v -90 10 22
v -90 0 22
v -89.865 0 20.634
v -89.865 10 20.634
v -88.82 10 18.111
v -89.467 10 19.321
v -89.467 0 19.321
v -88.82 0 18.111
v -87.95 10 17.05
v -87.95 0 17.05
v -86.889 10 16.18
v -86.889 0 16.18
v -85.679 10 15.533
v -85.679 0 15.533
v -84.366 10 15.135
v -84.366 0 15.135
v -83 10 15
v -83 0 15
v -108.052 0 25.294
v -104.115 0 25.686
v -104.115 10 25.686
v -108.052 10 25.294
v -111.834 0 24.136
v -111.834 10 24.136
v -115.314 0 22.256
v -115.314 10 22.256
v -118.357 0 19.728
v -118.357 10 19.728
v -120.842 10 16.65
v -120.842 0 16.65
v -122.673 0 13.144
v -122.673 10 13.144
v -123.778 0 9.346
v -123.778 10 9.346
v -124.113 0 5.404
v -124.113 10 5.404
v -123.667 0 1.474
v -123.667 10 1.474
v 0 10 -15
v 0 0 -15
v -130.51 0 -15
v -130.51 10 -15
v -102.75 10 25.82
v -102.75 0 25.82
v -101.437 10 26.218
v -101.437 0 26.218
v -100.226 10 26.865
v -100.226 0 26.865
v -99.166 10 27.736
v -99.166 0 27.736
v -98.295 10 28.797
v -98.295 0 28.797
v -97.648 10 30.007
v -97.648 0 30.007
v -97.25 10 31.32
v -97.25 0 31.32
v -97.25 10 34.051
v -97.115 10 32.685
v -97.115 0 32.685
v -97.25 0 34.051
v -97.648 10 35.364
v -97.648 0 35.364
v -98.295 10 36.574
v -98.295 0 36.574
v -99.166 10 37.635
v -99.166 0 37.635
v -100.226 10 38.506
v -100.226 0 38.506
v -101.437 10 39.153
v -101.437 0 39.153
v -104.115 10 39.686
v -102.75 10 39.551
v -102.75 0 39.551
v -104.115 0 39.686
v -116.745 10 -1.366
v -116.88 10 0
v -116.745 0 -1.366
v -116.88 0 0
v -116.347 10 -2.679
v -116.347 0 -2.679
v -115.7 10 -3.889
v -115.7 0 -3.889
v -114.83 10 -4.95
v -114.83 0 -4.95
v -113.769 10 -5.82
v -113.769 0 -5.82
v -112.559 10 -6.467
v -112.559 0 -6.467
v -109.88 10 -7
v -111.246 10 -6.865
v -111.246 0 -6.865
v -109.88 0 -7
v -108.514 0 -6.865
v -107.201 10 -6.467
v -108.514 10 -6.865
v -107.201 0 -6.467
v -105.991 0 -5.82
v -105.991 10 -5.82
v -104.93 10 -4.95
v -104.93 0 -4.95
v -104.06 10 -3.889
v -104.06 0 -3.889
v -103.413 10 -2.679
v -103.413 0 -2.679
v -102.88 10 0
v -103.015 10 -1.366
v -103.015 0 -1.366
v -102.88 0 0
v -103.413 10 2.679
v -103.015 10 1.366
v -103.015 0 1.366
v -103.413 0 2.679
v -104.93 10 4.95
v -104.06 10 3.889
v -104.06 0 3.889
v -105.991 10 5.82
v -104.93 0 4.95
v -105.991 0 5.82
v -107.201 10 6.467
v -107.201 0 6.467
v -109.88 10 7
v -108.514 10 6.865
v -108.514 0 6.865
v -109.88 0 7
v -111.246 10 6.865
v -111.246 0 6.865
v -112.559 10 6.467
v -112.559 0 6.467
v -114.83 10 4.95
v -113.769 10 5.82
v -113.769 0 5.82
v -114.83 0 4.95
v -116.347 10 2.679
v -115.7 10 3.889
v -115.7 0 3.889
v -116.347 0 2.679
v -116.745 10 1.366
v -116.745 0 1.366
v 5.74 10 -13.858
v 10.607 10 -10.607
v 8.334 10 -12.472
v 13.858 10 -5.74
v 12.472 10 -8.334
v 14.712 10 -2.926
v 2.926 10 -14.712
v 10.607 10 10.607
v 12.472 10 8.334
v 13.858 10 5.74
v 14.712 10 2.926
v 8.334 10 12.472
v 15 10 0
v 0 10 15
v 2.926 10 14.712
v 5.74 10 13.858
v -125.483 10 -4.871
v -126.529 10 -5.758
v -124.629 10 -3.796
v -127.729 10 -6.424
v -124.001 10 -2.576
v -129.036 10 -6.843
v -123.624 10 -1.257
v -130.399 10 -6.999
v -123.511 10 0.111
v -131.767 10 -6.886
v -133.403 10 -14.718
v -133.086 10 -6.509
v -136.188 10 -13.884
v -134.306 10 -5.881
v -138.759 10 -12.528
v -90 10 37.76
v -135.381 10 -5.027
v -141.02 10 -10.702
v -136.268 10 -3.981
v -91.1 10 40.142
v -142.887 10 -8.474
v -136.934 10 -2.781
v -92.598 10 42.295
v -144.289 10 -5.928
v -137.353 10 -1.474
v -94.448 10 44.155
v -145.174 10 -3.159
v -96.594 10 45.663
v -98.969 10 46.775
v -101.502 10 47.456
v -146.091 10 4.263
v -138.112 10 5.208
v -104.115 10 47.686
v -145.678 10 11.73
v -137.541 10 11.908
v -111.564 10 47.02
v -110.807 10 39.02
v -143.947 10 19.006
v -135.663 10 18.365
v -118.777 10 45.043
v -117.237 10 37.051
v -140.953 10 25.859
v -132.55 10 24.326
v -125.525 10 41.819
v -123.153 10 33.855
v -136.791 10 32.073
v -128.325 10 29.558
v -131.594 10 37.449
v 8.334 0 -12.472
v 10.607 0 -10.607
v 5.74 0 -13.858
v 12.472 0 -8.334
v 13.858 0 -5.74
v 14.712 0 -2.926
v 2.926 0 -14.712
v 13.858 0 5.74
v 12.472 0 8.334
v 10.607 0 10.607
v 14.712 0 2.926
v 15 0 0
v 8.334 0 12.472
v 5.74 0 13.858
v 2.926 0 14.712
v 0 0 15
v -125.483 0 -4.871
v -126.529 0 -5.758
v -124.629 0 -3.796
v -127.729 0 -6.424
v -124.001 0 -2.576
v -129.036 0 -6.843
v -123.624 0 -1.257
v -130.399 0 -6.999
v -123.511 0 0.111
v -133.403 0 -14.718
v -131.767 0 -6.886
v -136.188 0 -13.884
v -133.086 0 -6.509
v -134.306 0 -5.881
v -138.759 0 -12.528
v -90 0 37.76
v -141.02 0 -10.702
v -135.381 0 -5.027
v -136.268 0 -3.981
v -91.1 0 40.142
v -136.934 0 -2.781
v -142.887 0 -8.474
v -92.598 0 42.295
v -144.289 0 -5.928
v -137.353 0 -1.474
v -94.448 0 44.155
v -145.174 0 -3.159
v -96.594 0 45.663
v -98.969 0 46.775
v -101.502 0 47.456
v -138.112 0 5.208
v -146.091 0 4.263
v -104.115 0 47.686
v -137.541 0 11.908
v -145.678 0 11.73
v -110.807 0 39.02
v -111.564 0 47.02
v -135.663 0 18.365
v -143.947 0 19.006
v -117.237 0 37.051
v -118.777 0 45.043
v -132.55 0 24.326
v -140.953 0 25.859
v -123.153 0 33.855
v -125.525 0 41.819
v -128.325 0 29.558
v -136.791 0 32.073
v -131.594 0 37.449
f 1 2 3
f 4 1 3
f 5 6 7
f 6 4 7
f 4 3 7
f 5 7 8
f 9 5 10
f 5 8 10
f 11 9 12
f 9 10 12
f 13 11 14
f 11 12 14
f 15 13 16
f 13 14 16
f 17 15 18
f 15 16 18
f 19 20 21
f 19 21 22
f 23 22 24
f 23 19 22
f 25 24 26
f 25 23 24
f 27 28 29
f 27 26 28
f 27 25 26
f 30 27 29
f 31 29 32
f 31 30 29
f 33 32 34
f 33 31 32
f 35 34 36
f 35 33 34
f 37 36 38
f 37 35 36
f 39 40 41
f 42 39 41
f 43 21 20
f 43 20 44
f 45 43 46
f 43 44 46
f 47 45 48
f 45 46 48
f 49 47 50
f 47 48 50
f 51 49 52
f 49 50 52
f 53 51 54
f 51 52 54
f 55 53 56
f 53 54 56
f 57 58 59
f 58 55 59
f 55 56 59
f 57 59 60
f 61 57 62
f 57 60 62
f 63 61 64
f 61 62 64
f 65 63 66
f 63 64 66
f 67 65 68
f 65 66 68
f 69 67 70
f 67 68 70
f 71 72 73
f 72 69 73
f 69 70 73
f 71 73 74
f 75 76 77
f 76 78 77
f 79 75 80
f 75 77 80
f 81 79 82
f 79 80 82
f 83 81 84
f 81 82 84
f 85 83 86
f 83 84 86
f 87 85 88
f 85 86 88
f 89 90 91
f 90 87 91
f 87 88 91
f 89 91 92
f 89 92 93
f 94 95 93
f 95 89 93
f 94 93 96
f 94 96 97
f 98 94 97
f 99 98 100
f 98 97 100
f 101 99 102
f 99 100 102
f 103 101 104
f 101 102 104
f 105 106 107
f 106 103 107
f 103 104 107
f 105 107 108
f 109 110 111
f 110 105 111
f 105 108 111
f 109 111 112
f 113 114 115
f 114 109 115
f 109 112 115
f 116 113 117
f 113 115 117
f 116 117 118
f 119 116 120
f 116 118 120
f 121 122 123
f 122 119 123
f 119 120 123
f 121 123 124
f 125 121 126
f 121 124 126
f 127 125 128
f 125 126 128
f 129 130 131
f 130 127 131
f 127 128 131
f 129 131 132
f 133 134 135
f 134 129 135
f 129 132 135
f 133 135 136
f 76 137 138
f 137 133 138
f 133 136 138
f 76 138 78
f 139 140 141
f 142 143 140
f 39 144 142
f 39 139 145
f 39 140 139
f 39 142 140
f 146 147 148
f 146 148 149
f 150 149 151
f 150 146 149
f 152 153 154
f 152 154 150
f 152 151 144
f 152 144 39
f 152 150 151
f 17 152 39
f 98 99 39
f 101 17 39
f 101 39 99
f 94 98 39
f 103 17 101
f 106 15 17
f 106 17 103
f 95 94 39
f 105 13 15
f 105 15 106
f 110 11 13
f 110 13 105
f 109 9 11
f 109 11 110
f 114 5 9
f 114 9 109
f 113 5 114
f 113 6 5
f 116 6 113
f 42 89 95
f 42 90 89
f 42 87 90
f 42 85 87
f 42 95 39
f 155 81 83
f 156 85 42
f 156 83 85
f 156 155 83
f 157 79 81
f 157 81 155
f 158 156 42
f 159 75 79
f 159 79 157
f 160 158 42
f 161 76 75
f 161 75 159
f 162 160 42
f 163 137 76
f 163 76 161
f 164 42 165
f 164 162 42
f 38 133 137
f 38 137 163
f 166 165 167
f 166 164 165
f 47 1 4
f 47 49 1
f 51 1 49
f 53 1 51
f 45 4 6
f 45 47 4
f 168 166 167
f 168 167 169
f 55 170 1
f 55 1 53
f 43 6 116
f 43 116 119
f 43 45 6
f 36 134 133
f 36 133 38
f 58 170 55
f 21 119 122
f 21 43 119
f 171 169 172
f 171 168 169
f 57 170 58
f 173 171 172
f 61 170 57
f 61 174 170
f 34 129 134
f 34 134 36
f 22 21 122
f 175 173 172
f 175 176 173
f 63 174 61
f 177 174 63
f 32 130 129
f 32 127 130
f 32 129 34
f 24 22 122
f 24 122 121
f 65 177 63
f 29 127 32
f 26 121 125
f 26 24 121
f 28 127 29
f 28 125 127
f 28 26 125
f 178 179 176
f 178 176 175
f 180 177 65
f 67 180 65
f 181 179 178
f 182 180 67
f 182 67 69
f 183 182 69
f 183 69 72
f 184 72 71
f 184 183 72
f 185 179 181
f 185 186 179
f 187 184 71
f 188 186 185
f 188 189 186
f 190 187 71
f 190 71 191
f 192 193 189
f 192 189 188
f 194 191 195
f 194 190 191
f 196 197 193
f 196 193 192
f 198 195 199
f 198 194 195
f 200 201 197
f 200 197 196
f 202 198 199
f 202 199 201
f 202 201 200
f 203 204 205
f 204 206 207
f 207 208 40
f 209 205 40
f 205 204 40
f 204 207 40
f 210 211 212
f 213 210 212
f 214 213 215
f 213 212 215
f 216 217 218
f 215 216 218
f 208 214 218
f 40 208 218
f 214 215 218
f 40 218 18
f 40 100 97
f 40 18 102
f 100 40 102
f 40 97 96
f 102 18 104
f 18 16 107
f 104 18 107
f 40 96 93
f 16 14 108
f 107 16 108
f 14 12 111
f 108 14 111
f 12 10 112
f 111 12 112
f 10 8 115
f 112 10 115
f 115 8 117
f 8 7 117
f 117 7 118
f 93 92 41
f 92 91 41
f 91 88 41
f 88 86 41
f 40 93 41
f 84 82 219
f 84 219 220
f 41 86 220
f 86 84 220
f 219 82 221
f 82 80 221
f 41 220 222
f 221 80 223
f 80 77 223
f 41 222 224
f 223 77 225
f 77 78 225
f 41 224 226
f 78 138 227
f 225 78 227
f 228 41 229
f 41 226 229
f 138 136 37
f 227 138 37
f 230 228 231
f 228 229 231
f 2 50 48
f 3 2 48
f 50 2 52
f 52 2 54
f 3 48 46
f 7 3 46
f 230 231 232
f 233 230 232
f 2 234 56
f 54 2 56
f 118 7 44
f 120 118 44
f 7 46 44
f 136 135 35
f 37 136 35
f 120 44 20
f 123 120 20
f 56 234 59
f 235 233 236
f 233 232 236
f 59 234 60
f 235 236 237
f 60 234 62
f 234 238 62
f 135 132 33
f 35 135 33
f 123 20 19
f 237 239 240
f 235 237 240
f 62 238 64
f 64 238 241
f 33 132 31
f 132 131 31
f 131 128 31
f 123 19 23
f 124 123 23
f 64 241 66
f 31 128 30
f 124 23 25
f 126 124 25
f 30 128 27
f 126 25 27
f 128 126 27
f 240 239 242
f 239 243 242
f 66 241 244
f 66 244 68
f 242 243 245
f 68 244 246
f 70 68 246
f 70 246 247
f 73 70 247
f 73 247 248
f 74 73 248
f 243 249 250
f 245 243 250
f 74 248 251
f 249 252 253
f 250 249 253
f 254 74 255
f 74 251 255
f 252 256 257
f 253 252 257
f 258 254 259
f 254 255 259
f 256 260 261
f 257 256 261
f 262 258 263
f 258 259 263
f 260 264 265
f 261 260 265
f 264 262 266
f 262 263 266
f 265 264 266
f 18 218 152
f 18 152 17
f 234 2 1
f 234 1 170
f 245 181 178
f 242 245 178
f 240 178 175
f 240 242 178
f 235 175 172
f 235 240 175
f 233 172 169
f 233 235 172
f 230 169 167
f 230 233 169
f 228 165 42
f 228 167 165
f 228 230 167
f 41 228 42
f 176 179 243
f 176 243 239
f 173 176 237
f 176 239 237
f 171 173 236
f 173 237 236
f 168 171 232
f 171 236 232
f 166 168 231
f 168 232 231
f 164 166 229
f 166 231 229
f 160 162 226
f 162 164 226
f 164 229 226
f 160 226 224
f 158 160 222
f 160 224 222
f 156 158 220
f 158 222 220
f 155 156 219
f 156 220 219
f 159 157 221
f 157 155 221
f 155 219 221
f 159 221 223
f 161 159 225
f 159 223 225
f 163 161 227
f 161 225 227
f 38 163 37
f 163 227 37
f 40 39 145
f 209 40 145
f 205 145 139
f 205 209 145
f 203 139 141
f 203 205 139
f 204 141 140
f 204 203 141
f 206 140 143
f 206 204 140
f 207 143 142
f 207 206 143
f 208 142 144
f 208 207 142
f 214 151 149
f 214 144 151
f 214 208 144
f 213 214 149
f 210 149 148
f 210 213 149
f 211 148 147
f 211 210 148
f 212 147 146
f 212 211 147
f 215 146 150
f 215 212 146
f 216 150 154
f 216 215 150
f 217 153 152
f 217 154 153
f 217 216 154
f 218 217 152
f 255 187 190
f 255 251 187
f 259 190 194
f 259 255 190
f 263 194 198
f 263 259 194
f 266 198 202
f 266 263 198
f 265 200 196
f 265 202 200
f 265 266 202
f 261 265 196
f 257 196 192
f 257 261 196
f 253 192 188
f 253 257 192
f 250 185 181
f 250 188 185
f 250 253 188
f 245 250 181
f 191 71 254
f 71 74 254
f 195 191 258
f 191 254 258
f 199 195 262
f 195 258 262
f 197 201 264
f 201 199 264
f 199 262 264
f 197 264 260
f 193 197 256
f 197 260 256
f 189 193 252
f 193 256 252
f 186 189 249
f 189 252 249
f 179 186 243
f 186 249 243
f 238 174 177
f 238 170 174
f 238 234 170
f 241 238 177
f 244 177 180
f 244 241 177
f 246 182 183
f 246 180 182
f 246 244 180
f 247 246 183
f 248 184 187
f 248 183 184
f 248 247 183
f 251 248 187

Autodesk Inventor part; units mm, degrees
ref_plane "YZ Plane" through (0, 0, 0) normal (1, 0, 0) x (0, 1, 0)
ref_plane "XZ Plane" through (0, 0, 0) normal (0, 1, 0) x (-1, 0, 0)
ref_plane "XY Plane" through (0, 0, 0) normal (0, 0, 1) x (1, 0, 0)
sketch "Sketch1" plane through (0, 0, 0) normal (0, 1, 0) x (-1, 0, 0)
  arc A0 (0, 15) -> (0, -15) centre (0, 0) ccw
  line L0 (0, -15) -> (130.51, -15)
  line L1 (0, 15) -> (83, 15)
  arc A1 (130.51, -15) -> (145.1737, -3.1586) centre (130.51, 0) ccw
  arc A2 (123.667, 1.474) -> (137.353, -1.474) centre (130.51, 0) ccw
  circle A3 centre (109.88, 0) radius 7
  arc A4 (123.667, 1.474) -> (104.1154, 25.6855) centre (104.1154, 5.6855) ccw
  arc A5 (104.1154, 39.6855) -> (104.1154, 25.6855) centre (104.1154, 32.6855) ccw
  arc A6 (137.353, -1.474) -> (104.1154, 39.6855) centre (104.1154, 5.6855) ccw
  arc A7 (104.1154, 47.6855) -> (90, 37.7605) centre (104.1154, 32.6855) ccw
  line L2 (90, 22) -> (90, 37.7605)
  arc A8 (145.1737, -3.1586) -> (104.1154, 47.6855) centre (104.1154, 5.6855) ccw
  arc A9 (83, 15) -> (90, 22) centre (83, 22) ccw
  point P0 (90, 15)
  dimension "d0" = 30
  dimension "d1" = 130.51
  dimension "d2" = 90
  dimension "d3" = 15
  dimension "d4" = 14
  dimension "d5" = 20.63
  dimension "d6" = 14
  dimension "d9" = 20
  dimension "d11" = 14
  dimension "d12" = 15
  dimension "d13" = 42
  dimension "d14" = 7
extrude "Extrusion1" add sketch "Sketch1" along normal blind 10
properties part number "Assignment#1"
